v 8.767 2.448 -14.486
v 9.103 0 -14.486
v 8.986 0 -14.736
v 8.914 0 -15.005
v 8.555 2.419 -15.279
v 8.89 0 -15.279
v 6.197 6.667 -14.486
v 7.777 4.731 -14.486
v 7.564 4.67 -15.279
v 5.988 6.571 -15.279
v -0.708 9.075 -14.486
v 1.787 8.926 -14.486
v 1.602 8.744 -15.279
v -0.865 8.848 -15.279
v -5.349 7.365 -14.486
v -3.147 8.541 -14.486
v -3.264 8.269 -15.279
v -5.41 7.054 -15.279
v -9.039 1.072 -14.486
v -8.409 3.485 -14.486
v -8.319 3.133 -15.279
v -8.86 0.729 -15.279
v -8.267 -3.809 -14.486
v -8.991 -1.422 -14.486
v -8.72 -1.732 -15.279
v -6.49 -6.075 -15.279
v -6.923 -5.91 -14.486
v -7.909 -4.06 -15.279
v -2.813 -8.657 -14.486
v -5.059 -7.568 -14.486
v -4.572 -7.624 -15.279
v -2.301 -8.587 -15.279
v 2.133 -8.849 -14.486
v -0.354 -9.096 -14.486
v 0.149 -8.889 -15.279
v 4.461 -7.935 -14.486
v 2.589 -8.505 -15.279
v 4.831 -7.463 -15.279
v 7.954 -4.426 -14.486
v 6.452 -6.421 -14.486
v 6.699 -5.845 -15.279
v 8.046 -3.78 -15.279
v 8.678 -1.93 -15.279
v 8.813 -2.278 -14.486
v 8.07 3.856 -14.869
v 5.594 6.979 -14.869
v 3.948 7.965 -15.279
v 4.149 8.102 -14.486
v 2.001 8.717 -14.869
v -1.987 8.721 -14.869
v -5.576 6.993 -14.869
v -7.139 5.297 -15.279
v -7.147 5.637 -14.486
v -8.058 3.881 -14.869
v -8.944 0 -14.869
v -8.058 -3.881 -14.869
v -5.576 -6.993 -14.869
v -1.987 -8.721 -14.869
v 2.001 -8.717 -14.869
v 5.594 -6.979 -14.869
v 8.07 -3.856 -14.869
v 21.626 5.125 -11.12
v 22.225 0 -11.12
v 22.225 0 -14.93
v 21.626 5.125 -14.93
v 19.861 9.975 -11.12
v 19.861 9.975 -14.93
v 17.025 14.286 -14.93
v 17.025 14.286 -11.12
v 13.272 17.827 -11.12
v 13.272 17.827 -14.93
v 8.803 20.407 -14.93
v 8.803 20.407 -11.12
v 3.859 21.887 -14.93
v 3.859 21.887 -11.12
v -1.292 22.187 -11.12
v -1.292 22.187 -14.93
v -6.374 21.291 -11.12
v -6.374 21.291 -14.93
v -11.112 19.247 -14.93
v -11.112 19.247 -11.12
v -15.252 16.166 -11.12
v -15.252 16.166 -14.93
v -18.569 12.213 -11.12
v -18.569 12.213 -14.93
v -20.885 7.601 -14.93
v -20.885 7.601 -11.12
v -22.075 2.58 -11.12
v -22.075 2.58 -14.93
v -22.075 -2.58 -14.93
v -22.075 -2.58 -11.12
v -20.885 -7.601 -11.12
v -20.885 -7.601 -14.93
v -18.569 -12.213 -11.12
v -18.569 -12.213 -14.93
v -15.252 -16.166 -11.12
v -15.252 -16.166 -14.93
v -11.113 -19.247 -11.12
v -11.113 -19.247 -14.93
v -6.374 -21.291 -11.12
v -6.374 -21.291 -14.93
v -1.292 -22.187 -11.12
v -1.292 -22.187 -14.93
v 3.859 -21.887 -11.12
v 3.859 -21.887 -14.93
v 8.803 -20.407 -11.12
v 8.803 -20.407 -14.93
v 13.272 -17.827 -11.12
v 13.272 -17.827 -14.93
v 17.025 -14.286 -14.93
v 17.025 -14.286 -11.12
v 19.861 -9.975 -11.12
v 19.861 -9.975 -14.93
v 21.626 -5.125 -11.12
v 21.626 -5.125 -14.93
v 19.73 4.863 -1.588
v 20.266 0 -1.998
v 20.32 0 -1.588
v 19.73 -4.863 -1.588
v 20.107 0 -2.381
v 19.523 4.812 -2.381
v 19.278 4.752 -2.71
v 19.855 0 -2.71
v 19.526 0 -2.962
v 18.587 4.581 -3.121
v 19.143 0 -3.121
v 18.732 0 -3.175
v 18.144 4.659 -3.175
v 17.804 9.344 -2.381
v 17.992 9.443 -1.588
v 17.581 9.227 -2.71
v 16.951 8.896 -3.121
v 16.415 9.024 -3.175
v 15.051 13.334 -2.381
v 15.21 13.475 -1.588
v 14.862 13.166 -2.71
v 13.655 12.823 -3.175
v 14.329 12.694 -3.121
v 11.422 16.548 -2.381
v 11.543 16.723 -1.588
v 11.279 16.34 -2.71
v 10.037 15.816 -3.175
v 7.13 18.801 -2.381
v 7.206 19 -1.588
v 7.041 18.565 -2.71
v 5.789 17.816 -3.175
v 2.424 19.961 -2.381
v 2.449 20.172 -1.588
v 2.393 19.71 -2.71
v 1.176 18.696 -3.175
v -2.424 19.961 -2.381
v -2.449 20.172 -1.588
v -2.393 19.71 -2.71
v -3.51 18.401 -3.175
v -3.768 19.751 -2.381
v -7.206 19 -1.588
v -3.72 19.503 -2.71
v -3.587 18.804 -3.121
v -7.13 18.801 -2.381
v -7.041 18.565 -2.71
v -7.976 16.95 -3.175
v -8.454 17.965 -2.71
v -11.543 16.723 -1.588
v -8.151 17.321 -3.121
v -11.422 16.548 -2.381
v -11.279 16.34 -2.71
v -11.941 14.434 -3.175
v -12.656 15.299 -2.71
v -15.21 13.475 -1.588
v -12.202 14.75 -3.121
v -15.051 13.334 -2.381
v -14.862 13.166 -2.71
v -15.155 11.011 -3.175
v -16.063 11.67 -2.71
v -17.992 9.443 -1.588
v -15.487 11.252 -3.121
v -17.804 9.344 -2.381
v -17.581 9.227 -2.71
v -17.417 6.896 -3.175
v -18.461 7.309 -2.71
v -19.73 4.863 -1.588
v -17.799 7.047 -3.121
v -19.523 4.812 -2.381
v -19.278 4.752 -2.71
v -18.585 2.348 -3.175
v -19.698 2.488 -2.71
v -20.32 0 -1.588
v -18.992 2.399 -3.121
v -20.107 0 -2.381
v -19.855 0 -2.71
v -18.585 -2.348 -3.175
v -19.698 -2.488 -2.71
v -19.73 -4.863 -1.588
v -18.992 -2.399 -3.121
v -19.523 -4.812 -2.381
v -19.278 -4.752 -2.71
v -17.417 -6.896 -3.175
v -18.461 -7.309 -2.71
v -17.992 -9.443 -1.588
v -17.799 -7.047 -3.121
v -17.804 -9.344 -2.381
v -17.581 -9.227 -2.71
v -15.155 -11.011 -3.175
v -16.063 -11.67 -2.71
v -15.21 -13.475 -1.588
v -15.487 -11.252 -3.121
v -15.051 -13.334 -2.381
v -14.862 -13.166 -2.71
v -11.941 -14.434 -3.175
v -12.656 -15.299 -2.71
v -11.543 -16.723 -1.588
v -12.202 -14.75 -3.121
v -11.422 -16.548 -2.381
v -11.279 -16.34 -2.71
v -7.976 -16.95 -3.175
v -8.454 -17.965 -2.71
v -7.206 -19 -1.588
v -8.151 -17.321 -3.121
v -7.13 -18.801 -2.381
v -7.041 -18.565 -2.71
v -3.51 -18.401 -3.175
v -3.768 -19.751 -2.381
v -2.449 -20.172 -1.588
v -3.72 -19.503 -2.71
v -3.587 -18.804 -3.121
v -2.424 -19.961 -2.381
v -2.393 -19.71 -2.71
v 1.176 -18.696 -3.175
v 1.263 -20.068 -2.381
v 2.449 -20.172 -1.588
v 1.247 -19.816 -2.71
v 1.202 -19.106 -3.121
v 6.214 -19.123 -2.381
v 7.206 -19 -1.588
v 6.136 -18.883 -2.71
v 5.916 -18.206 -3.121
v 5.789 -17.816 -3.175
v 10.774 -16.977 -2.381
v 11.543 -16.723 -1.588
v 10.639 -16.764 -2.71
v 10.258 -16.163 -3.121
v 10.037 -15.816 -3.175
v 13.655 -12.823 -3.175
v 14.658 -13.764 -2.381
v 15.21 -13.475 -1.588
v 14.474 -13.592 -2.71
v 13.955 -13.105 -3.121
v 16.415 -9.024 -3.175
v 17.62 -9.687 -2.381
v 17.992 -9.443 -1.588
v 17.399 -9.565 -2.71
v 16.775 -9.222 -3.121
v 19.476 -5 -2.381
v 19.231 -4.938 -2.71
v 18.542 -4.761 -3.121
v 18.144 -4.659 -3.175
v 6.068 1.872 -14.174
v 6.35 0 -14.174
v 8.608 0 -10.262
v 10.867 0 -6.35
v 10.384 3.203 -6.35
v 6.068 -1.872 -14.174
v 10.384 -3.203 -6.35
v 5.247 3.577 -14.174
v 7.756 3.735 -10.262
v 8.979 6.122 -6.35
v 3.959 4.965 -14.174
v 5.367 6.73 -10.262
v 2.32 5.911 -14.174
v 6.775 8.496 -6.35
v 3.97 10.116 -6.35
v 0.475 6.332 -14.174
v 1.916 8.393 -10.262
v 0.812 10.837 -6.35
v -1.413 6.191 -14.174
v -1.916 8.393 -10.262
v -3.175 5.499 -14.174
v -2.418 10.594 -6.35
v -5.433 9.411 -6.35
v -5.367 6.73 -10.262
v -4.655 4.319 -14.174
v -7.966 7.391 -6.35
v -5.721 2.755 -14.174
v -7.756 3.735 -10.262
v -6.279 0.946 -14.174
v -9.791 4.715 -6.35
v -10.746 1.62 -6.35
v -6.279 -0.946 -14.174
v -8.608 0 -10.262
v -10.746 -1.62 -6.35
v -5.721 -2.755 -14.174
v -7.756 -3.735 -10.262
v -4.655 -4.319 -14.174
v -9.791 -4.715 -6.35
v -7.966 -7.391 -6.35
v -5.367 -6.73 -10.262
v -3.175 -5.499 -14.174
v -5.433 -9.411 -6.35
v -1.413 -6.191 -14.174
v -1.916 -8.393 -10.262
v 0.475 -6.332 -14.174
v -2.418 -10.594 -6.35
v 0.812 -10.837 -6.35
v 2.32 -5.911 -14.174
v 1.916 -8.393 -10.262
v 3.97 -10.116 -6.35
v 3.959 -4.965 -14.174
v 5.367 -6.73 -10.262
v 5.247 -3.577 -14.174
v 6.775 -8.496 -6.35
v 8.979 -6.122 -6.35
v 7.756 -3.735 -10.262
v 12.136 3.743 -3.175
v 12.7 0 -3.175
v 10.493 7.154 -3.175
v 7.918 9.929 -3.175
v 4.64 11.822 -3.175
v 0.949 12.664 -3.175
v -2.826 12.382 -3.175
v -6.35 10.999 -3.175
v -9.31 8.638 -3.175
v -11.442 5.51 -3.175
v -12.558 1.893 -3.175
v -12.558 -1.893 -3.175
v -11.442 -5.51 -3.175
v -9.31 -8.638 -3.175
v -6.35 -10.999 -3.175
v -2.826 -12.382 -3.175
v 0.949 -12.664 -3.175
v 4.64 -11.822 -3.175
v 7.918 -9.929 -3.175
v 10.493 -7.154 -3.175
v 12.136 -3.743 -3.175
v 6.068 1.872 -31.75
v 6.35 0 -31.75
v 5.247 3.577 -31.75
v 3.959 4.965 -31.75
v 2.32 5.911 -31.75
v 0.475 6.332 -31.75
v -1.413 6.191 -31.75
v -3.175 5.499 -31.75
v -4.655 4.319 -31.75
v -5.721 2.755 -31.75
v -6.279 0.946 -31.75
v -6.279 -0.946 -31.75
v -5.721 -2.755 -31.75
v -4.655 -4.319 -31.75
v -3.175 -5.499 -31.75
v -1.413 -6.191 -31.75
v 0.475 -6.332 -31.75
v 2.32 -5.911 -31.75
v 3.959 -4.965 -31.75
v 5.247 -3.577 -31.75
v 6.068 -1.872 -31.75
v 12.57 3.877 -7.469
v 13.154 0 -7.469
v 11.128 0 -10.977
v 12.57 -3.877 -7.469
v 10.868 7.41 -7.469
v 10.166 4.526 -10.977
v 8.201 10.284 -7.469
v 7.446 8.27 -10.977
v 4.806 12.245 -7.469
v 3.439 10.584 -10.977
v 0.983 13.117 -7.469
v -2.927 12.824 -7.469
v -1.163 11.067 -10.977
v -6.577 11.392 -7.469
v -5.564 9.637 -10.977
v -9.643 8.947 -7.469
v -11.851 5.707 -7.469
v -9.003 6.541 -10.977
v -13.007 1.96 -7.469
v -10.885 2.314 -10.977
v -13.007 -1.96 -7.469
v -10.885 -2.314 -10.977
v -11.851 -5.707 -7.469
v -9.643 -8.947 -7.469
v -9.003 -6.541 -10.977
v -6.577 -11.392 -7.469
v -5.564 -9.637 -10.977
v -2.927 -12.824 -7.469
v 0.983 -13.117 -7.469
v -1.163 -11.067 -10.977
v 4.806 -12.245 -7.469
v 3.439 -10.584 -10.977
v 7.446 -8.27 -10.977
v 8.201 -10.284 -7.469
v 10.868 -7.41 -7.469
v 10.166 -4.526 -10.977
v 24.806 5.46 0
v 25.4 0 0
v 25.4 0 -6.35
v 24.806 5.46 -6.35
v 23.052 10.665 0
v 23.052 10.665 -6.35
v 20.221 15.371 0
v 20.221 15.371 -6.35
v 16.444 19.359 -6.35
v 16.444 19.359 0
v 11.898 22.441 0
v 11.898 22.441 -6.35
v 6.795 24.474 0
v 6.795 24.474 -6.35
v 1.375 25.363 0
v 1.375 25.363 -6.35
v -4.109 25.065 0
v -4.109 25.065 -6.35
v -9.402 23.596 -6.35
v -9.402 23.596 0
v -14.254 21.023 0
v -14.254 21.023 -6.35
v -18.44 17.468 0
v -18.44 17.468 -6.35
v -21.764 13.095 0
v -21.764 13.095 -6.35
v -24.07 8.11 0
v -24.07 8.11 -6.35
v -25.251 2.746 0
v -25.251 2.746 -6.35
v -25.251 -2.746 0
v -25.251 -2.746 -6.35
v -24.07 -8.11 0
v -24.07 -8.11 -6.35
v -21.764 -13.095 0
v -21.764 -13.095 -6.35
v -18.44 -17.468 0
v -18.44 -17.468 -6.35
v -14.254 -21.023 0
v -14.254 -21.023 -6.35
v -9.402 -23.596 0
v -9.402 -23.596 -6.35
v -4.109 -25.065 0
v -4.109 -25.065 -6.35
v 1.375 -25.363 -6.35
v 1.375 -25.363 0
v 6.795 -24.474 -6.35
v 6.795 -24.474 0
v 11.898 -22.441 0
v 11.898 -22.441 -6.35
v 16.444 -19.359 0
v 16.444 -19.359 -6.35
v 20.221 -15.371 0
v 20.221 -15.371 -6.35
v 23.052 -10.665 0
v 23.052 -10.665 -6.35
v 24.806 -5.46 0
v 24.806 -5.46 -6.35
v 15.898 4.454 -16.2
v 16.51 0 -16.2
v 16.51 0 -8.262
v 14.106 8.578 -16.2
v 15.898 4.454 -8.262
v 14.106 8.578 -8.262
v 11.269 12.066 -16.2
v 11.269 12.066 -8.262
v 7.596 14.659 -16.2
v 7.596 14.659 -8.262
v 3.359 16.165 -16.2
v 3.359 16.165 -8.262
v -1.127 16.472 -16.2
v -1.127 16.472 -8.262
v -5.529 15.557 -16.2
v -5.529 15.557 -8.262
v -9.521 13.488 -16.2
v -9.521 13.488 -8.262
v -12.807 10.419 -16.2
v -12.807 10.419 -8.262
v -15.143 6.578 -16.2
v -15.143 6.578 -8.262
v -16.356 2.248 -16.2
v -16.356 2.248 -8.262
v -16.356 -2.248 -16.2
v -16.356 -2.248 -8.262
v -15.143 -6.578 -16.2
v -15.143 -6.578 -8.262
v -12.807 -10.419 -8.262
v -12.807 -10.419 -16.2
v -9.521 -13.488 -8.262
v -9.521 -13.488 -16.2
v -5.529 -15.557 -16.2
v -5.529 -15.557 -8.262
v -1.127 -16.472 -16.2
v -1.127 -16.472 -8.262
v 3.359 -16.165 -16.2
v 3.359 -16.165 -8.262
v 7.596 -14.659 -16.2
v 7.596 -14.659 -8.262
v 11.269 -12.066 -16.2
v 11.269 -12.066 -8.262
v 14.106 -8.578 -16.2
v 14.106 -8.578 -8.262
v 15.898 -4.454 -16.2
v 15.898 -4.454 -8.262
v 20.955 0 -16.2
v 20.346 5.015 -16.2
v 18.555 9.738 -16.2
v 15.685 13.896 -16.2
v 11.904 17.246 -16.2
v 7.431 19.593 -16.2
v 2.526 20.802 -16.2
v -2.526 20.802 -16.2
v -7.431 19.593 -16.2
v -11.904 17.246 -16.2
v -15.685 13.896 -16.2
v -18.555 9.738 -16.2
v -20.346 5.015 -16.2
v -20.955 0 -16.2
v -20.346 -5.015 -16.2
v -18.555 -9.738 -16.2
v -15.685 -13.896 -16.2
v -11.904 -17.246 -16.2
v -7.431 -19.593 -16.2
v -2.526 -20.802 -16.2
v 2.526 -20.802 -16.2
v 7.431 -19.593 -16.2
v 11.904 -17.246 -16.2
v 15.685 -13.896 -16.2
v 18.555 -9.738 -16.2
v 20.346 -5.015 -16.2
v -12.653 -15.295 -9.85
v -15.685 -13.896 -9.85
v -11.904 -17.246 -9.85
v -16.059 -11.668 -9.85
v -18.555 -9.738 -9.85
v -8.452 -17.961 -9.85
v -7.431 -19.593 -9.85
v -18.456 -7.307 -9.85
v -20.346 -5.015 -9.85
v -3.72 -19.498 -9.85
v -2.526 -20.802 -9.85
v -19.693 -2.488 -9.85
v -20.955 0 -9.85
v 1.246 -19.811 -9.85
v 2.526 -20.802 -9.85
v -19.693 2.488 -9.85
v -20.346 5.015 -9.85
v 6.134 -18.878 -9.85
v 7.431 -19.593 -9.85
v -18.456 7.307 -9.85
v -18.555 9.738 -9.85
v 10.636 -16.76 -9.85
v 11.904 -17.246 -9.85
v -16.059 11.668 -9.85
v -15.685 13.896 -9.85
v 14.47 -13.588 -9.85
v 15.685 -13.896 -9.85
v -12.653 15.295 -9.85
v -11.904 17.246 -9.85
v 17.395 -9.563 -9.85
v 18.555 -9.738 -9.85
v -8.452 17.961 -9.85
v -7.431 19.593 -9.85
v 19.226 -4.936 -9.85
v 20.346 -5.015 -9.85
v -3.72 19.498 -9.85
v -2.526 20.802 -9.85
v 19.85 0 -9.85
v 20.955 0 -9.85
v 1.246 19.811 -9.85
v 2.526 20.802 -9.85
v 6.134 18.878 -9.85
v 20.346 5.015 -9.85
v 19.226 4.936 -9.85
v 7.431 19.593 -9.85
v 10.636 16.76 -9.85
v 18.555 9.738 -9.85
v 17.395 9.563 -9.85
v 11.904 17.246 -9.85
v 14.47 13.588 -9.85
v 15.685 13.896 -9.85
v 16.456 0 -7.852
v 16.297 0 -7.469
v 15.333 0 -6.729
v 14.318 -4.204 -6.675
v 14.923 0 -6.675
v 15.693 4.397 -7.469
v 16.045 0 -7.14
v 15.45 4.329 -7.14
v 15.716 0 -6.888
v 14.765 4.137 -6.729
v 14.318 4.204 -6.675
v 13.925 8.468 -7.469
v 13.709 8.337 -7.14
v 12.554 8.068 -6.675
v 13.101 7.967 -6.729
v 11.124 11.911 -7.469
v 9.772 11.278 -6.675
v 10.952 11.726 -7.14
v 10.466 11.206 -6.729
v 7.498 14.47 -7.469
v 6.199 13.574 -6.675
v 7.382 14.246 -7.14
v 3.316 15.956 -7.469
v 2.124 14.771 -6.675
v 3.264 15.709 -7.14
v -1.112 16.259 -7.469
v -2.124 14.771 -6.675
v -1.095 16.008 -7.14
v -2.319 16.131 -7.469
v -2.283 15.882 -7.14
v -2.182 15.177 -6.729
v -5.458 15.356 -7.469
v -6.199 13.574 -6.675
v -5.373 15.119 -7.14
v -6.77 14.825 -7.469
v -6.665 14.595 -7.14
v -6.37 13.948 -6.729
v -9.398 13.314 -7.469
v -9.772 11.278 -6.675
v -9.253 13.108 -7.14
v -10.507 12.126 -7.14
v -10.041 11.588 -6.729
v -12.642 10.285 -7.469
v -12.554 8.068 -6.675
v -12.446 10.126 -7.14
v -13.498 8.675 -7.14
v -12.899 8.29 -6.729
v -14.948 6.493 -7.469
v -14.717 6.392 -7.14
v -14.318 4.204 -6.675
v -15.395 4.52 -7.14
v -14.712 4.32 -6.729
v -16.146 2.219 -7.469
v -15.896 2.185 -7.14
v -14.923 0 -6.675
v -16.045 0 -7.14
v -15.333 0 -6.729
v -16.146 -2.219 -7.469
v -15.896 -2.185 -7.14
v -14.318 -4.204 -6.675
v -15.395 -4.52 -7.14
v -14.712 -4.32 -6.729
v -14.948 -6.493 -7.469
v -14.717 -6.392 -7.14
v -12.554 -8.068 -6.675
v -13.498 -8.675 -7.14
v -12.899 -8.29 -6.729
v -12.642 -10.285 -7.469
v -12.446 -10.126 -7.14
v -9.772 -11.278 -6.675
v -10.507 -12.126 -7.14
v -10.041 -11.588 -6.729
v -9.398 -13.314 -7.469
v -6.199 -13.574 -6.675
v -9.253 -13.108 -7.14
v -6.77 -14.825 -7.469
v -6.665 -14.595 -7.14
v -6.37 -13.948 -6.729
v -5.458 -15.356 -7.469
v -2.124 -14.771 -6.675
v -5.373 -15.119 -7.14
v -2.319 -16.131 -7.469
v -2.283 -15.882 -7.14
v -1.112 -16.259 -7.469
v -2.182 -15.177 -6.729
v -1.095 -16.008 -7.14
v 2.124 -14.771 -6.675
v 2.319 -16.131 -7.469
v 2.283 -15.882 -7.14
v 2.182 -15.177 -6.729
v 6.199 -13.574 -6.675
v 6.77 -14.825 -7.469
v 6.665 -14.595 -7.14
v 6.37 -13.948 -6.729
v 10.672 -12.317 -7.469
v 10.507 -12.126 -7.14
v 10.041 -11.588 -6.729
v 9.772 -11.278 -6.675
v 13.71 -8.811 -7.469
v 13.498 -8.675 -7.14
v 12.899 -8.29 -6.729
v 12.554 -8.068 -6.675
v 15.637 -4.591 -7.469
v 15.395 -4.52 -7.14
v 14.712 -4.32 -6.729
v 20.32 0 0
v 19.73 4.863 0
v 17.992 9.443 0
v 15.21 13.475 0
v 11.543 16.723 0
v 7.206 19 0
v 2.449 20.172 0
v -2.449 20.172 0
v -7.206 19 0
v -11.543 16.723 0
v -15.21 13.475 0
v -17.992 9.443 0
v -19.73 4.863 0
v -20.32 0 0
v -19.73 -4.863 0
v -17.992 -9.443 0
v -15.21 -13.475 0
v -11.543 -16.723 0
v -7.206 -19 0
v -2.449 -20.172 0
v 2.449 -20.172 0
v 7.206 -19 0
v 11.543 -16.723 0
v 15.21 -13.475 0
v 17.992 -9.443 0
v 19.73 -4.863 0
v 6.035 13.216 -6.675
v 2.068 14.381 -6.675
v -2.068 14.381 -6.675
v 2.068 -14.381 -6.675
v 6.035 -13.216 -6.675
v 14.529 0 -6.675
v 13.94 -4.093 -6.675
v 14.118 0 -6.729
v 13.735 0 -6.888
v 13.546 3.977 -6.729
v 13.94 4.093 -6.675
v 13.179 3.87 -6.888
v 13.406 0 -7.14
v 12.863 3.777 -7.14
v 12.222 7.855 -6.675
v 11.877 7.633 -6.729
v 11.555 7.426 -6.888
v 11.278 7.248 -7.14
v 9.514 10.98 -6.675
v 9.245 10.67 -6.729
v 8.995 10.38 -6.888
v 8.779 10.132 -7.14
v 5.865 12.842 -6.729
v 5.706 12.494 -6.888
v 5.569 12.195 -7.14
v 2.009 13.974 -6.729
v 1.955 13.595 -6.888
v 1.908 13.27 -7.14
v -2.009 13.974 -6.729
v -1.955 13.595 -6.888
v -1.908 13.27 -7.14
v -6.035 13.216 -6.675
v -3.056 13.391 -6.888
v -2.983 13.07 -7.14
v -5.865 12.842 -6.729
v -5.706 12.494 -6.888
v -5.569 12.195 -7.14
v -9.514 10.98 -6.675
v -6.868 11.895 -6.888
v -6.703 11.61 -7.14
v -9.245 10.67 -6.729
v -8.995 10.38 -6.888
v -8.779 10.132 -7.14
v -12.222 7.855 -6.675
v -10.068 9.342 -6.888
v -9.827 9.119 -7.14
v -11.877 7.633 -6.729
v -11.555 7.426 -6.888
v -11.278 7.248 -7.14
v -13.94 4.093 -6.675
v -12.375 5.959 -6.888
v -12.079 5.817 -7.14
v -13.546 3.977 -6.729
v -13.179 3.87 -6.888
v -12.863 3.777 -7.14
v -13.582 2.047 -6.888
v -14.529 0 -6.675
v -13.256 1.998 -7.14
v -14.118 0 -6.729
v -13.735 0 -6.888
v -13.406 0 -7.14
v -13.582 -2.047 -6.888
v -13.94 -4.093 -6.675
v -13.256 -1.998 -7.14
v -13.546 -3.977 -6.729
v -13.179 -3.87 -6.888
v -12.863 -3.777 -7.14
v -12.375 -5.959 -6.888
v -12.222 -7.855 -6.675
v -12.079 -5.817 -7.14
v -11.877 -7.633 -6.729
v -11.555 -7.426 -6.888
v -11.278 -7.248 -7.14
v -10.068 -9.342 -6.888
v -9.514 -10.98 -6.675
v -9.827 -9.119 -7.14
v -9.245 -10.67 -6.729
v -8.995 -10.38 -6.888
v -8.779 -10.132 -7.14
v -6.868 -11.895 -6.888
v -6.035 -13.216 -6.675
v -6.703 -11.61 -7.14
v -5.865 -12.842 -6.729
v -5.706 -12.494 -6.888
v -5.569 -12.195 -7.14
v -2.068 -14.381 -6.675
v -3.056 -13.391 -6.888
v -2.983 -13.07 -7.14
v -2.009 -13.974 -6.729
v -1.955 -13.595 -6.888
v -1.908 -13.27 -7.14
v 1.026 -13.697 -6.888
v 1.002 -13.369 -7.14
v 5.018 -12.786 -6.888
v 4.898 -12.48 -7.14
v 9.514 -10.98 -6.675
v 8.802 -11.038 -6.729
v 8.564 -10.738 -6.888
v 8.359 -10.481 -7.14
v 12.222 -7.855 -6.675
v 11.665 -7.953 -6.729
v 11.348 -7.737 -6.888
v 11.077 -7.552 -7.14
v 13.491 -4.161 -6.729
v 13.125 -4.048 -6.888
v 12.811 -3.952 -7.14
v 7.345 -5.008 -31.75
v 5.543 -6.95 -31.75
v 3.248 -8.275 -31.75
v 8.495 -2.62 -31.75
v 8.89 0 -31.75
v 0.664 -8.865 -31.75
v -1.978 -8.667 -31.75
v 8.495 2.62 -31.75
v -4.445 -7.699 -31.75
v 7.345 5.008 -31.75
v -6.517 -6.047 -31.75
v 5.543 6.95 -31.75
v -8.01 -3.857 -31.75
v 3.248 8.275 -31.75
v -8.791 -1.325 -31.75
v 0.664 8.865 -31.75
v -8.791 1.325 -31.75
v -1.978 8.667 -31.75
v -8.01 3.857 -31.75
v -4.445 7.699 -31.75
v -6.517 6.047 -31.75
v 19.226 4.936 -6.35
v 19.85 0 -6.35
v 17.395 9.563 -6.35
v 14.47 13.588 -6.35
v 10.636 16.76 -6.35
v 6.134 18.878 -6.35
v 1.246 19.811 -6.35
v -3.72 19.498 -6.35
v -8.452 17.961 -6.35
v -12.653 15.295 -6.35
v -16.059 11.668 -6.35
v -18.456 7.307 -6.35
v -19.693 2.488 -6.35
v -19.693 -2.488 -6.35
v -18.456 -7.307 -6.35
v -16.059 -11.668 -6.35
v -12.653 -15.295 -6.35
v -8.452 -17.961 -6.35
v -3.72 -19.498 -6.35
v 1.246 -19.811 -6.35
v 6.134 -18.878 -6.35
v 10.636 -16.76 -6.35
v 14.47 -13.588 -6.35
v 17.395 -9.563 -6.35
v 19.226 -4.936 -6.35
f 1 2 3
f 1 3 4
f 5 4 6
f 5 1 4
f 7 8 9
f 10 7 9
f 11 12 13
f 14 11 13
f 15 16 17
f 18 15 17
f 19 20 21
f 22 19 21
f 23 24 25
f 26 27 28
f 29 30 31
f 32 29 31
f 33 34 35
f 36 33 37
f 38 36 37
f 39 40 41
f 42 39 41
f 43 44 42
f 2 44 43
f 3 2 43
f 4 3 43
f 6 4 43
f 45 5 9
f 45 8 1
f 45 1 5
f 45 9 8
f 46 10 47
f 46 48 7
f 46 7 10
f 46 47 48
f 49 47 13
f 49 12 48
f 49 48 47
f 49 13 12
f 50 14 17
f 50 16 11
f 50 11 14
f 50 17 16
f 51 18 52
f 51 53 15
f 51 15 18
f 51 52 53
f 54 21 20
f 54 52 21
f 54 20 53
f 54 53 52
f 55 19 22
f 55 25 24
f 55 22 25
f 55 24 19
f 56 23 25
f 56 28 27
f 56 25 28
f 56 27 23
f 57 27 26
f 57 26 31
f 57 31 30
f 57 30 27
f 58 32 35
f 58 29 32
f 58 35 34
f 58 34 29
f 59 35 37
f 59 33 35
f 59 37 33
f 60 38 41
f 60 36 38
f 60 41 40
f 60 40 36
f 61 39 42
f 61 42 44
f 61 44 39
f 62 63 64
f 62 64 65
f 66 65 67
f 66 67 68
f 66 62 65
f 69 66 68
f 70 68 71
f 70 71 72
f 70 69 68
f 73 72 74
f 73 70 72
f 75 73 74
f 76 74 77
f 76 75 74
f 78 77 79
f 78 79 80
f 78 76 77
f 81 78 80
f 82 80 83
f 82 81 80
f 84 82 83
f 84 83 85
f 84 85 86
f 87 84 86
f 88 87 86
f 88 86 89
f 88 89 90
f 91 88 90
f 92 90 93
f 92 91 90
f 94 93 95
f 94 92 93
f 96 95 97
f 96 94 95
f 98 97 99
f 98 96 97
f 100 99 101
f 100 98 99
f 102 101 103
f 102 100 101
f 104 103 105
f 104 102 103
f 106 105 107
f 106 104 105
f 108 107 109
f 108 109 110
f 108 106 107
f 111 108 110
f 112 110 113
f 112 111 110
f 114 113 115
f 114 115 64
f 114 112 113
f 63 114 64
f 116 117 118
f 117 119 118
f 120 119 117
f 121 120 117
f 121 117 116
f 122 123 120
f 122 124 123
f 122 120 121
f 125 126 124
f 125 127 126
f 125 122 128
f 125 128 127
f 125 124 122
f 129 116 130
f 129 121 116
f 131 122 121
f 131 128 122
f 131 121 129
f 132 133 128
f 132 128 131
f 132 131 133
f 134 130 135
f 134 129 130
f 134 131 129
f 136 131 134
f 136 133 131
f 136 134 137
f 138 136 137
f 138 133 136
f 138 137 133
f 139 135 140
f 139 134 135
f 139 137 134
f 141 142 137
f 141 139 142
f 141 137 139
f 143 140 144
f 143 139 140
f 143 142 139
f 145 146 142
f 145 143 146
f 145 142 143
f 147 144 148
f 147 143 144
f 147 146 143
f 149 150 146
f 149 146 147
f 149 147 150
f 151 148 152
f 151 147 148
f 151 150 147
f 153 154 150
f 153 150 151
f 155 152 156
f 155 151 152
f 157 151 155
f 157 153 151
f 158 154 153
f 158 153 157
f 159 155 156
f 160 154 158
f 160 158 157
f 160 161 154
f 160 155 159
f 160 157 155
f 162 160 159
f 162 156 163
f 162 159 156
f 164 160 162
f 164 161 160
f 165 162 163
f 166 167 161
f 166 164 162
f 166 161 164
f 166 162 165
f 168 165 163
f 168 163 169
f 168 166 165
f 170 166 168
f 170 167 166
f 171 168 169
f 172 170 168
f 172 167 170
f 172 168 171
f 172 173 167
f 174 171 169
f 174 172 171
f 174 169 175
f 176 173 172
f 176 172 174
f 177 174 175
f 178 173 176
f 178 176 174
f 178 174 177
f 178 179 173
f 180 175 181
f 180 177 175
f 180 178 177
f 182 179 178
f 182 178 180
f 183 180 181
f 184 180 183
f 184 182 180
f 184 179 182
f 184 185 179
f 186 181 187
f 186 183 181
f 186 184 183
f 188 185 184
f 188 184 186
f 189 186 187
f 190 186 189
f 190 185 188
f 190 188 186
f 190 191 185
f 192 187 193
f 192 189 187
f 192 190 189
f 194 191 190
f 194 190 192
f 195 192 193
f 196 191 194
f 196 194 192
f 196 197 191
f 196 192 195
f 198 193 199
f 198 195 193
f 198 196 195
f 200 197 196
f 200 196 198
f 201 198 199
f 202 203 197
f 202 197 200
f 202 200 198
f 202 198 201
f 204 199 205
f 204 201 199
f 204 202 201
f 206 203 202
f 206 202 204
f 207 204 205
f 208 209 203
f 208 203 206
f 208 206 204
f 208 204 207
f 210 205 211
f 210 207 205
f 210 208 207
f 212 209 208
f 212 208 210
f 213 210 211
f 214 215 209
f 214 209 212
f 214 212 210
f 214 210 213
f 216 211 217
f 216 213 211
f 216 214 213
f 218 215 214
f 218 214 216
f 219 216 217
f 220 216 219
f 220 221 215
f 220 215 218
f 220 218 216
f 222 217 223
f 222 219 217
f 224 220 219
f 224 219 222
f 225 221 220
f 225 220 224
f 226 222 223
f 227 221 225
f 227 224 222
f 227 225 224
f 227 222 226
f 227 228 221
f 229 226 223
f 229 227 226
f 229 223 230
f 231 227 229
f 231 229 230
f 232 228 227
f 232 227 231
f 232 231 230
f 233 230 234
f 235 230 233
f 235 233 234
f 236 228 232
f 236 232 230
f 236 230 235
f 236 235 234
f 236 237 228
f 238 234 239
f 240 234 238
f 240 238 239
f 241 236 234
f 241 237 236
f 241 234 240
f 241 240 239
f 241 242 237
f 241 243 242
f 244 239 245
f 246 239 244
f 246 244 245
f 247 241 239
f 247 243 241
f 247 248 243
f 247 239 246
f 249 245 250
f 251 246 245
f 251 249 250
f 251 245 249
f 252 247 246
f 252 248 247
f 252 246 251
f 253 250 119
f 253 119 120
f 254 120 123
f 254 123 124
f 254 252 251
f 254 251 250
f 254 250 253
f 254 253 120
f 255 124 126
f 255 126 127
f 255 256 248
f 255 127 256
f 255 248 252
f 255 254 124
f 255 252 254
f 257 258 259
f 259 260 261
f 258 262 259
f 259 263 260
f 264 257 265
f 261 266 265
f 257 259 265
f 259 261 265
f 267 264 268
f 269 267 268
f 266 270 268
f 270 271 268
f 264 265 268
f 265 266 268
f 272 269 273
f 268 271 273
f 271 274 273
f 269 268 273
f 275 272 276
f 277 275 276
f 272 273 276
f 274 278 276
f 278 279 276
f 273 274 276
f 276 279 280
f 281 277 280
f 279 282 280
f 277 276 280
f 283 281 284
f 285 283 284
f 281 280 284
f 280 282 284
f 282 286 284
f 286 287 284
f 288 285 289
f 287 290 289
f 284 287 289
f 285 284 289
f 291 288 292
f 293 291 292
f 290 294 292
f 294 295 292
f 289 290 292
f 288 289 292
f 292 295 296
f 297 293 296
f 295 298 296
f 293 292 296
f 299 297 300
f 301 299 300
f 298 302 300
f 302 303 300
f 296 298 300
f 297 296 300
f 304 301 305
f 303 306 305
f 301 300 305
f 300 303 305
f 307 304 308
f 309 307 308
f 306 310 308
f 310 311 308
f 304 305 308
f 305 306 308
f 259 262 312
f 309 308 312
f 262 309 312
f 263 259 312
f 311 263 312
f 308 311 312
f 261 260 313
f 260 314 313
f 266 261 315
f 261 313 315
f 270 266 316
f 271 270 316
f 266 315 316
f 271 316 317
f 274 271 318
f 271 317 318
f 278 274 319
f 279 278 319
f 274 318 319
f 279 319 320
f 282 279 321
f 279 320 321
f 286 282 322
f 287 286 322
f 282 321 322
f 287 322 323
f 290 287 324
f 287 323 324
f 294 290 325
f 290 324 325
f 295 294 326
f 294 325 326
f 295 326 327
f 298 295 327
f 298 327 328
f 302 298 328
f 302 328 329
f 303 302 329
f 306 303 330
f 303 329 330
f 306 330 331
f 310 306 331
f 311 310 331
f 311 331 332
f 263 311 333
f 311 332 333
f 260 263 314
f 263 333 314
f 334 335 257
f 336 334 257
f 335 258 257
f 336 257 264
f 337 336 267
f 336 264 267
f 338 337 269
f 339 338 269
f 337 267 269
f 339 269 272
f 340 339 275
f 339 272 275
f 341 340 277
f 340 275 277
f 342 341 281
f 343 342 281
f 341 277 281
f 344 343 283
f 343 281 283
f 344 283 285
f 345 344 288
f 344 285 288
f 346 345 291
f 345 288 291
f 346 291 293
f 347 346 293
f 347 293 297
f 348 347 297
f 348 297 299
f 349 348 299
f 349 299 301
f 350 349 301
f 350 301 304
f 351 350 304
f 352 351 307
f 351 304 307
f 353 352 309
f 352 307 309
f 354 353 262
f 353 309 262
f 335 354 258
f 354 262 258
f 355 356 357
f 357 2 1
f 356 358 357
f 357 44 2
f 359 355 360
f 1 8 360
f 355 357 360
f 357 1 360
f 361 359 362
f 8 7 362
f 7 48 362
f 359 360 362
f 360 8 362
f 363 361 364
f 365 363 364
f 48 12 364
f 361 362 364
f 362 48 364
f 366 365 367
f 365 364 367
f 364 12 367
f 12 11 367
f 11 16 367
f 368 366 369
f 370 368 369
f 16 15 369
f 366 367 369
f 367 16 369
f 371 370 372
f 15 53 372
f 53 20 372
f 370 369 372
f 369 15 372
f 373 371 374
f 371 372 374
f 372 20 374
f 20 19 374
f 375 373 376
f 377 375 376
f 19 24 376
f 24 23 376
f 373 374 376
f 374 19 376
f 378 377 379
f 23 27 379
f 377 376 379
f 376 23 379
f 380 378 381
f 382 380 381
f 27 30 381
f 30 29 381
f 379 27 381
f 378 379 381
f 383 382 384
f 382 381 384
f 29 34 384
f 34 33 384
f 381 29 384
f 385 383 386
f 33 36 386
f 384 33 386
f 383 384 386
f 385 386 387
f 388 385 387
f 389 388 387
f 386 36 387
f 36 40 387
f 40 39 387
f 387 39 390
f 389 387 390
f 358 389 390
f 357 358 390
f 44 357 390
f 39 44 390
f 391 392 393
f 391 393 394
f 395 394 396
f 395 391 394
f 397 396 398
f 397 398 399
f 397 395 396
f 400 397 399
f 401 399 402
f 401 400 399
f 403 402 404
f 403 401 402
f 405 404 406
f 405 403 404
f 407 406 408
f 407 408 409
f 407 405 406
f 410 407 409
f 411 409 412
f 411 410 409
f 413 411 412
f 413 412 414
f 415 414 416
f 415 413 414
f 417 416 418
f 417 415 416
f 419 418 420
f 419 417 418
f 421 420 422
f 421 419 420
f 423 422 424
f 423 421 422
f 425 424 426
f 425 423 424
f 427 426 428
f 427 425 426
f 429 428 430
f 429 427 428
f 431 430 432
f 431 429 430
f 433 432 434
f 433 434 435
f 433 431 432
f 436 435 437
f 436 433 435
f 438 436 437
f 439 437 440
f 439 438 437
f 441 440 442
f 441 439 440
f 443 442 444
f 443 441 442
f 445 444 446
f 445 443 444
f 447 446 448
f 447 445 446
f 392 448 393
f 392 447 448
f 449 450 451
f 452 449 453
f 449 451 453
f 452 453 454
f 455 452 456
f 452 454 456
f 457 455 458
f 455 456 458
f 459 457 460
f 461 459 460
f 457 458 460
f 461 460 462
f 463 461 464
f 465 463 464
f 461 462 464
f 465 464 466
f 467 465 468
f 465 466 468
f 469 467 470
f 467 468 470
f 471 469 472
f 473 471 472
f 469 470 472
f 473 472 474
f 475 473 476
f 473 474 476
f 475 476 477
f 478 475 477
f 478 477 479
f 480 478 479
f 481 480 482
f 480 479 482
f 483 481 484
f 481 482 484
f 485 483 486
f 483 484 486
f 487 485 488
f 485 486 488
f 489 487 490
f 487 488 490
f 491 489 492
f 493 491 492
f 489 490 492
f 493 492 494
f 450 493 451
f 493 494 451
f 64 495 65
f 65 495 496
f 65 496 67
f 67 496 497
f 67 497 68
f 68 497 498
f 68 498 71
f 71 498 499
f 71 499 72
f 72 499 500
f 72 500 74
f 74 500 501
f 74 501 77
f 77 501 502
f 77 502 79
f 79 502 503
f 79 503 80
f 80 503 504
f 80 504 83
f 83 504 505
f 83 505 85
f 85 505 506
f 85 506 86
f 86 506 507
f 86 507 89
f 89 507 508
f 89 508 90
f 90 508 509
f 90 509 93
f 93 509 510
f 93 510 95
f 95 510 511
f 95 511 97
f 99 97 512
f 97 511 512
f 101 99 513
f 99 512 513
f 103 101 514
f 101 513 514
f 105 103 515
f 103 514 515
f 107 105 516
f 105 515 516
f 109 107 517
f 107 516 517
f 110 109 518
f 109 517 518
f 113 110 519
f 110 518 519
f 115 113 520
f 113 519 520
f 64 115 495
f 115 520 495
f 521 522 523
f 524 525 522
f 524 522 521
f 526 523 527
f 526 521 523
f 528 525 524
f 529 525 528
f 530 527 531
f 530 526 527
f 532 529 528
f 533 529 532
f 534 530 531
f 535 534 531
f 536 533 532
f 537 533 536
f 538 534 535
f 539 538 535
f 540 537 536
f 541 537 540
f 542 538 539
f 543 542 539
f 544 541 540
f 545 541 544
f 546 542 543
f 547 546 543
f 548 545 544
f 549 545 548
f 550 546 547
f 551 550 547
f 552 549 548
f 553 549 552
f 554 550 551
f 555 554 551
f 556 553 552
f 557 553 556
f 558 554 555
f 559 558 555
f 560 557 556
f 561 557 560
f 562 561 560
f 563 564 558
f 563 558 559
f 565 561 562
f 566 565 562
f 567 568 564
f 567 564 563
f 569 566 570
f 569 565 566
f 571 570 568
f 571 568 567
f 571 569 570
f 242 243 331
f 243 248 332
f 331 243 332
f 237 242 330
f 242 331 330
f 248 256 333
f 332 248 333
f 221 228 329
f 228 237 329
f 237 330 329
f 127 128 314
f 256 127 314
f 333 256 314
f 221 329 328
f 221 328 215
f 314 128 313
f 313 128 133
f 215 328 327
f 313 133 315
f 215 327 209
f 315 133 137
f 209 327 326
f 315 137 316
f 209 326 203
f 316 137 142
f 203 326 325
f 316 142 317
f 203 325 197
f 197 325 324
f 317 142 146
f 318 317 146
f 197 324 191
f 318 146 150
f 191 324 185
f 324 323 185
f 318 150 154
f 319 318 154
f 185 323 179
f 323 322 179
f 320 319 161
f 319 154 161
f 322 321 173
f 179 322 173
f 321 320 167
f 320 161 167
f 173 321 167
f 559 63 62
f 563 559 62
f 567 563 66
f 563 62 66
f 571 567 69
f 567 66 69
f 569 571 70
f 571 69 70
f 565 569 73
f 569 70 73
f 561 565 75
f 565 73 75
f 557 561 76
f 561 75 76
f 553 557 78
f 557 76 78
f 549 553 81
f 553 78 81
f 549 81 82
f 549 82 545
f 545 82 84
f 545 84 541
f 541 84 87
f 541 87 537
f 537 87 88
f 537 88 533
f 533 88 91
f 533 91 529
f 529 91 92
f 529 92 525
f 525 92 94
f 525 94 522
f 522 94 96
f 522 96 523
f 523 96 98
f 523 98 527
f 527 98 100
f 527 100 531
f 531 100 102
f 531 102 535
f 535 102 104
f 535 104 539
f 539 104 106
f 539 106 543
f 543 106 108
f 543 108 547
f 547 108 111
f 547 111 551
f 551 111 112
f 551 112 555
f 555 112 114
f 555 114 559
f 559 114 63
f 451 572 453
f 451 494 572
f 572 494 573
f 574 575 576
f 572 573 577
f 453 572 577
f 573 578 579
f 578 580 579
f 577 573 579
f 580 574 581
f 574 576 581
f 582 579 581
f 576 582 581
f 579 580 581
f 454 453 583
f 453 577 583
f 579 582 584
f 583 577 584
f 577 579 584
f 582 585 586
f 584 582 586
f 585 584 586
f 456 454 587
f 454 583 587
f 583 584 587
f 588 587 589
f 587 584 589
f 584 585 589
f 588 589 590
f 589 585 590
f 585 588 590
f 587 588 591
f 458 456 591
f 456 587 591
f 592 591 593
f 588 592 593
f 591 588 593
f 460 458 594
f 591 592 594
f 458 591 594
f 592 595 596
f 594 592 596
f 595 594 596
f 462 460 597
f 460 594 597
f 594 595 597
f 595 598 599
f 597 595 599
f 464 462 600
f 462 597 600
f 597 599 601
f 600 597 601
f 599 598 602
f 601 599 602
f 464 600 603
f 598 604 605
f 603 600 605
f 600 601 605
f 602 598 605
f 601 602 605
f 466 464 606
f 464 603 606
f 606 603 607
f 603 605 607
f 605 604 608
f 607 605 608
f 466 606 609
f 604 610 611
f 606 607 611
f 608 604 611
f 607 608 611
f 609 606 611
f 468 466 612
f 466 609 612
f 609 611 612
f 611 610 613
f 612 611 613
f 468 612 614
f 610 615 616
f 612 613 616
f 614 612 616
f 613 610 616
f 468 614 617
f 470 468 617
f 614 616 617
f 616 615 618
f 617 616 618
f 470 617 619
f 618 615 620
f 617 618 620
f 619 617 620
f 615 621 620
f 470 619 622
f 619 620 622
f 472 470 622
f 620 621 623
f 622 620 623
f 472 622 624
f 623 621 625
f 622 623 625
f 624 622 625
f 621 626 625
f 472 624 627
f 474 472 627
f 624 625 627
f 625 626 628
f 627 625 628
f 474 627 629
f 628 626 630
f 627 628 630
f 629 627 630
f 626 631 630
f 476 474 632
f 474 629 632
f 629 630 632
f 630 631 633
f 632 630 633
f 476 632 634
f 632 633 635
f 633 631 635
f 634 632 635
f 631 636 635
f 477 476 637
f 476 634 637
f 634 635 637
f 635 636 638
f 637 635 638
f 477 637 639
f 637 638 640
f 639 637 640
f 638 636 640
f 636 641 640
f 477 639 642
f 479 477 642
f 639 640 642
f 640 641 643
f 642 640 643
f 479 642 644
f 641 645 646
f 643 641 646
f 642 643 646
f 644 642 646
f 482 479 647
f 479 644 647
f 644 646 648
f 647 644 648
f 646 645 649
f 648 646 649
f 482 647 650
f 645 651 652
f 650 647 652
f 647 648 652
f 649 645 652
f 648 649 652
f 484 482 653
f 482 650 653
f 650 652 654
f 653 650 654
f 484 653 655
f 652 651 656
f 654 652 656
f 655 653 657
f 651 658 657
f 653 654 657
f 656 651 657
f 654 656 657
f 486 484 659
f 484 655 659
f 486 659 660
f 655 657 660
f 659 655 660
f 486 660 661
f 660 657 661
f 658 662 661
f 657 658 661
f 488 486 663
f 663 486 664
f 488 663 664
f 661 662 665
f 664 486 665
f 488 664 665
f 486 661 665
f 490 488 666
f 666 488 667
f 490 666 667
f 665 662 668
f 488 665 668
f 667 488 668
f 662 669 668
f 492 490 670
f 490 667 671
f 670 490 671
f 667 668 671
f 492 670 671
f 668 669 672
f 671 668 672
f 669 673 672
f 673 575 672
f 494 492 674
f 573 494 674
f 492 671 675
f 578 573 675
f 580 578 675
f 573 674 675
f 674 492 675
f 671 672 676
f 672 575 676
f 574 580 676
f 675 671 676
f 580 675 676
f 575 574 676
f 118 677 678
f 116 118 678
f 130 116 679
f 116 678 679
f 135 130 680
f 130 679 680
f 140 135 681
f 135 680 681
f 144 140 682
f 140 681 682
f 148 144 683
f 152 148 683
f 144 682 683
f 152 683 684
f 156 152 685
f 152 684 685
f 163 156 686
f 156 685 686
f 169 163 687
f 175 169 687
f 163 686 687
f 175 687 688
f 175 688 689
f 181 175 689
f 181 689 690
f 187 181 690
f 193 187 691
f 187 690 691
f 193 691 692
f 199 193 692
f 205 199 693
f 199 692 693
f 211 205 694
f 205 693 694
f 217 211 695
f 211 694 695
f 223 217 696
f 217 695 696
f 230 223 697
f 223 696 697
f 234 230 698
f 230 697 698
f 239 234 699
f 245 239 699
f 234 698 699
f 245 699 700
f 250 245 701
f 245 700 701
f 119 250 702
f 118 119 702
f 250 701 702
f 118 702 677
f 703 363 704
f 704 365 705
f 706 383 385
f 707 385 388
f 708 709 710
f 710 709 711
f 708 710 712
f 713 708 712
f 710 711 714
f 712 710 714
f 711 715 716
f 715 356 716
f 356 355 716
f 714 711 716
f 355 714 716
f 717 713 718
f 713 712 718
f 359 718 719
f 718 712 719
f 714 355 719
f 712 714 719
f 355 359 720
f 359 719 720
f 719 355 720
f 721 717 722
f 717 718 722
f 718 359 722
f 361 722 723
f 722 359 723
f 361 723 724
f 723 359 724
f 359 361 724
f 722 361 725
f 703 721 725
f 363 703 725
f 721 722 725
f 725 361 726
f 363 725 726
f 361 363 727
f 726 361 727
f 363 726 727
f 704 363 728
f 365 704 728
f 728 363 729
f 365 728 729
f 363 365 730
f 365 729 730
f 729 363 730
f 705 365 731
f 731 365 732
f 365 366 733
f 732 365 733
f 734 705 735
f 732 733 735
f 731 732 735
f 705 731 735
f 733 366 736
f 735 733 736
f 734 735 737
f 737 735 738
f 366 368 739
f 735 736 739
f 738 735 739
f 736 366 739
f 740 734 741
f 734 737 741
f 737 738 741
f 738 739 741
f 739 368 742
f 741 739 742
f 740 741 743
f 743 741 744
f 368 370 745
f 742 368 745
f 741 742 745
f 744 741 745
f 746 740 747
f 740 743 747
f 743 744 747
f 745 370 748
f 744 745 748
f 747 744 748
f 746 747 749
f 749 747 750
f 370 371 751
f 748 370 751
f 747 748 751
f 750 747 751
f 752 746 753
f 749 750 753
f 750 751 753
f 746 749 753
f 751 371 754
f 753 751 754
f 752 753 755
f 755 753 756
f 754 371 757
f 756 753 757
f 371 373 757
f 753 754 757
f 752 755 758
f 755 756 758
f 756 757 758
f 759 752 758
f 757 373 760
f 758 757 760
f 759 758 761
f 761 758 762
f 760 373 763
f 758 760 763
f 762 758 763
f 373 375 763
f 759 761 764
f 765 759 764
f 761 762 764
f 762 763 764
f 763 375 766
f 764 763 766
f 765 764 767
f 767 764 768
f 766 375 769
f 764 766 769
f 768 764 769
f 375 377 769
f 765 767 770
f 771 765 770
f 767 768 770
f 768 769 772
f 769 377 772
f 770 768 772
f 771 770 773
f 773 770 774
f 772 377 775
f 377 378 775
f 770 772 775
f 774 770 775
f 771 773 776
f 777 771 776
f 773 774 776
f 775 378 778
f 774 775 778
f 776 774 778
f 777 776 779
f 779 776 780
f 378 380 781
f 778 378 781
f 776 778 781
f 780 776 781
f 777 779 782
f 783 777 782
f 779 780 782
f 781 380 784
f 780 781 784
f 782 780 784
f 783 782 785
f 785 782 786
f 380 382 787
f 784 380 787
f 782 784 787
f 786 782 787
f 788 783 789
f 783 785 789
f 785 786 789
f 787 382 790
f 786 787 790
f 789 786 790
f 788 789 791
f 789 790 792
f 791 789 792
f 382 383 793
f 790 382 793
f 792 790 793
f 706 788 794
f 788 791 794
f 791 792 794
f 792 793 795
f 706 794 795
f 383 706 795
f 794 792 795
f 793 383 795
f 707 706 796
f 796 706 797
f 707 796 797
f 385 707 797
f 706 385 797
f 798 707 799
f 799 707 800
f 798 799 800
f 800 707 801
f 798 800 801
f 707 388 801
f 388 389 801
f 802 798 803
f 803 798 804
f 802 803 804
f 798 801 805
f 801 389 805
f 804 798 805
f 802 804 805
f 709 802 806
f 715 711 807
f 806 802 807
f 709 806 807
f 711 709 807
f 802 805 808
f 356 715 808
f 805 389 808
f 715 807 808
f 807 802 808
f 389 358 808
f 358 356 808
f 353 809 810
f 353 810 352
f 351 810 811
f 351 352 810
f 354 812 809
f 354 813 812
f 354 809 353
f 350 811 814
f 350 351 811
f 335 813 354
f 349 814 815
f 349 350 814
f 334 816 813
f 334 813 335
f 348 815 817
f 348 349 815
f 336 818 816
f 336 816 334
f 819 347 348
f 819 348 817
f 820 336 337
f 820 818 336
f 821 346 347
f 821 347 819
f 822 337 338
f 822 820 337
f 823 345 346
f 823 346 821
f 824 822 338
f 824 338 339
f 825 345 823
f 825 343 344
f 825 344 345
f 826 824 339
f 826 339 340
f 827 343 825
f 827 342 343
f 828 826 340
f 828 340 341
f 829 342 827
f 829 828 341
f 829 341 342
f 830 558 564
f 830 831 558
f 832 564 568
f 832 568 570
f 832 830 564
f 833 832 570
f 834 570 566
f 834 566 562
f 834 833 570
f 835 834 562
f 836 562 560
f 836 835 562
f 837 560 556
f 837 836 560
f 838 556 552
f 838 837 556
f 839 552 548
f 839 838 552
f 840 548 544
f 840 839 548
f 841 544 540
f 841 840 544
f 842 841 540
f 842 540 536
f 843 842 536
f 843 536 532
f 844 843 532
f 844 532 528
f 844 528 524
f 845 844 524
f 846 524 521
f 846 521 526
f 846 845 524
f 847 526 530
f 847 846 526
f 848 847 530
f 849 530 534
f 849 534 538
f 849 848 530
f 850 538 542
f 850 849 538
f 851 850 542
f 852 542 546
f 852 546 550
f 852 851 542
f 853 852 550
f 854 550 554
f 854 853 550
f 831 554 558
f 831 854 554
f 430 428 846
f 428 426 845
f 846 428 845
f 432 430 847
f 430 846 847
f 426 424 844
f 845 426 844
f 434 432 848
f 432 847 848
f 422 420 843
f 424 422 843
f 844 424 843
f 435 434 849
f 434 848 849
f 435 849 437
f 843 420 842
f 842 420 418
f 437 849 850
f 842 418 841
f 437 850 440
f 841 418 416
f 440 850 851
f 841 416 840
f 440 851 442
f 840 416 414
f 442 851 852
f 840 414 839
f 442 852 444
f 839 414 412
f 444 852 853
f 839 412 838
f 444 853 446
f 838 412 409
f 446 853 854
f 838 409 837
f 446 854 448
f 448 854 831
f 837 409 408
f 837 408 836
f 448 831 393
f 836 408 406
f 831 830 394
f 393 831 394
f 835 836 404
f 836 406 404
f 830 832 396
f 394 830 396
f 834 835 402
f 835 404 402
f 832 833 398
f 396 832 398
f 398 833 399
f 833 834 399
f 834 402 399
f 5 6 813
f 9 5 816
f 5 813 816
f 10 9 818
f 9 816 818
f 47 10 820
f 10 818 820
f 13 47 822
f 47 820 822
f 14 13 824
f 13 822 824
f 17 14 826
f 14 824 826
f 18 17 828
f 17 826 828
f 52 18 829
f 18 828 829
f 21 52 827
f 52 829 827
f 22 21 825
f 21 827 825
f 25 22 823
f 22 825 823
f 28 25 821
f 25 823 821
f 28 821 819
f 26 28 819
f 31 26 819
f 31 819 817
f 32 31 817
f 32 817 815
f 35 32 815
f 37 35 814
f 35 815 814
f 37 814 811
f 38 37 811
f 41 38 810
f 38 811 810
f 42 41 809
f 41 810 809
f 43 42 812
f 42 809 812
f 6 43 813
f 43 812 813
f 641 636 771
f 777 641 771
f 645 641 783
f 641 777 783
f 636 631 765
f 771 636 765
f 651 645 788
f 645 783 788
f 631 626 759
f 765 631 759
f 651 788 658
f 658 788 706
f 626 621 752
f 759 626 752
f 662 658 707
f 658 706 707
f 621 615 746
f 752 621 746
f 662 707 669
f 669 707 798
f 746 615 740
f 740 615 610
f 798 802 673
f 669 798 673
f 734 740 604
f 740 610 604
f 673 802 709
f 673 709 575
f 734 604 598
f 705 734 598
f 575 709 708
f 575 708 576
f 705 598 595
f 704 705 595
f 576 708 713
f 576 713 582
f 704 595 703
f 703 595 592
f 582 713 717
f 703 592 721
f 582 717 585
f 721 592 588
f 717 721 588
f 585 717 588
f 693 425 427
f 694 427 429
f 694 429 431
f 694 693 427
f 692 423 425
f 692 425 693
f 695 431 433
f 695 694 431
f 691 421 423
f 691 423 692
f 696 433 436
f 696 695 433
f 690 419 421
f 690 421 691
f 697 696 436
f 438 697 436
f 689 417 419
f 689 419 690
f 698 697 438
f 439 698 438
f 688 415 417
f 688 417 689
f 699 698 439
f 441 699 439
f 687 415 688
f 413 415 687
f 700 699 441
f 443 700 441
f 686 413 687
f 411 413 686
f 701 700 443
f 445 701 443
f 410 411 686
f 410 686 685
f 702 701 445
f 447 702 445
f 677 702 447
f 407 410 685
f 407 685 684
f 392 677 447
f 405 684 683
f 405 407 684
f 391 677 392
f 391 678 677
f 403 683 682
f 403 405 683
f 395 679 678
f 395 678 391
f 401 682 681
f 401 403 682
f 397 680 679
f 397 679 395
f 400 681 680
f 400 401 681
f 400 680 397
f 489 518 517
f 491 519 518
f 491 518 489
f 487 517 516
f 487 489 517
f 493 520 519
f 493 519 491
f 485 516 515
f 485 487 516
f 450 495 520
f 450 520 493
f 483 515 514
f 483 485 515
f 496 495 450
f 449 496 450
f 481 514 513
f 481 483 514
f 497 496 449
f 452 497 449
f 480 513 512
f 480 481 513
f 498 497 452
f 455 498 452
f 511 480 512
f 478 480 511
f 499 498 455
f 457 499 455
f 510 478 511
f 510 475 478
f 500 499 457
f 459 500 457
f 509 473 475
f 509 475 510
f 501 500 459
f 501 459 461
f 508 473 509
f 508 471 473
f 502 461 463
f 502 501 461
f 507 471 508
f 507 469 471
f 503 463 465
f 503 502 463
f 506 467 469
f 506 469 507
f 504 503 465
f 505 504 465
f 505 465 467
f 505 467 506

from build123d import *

# Parameters (mm, degrees)
F0_R     = 25.4
F1_DEPTH = 6.35
F4_SIZE  = 1.27
F9_R     = 1.5875


with BuildPart() as f1:
    # F0 (on Top) → F1 (new body)
    with BuildSketch(Plane.XY):
        Circle(F0_R)
    extrude(amount=-F1_DEPTH)

    # F2 (on Front) → F3 (revolve)
    with BuildSketch(Plane.XZ):
        Polygon((19.85, -6.35), (0, -6.35), (0, -31.75), (9.525, -31.75), (9.525, -16.2), (22.225, -16.2), (22.225, -9.85), (19.85, -9.85), align=None)
    revolve(axis=Axis((0, 0, -19.05), (0, 0, 1)))

    # F4
    f4_edges = [f1.edges().sort_by_distance(p)[0] for p in [
        (-22.225, 0, -9.85),
        (-22.225, 0, -16.2),
    ]]
    chamfer(f4_edges, length=F4_SIZE)

    # F5 (on Front) → F6 (revolve, cut)
    with BuildSketch(Plane.XZ):
        Polygon((20.32, 0), (0, 0), (0, -6.35), (10.8669128953, -6.35), (12.7, -3.175), (20.32, -3.175), align=None)
        Polygon((10.8669128953, -6.35), (0, -6.35), (0, -42.1200841665), (6.35, -42.1200841665), (6.35, -14.1735226281), align=None)
    revolve(axis=Axis((0, 0, 5.083523225), (0, 0, 1)), mode=Mode.SUBTRACT)

    # F7 (on Front) → F8 (revolve, cut)
    with BuildSketch(Plane.XZ):
        Polygon((16.51, -31.75), (16.51, -16.2), (9.525, -16.2), (8.89, -16.2), (8.89, -31.75), (9.525, -31.75), align=None)
        Polygon((9.525, -16.2), (16.51, -16.2), (16.51, -6.675), (13.6122134253, -6.675), (8.89, -14.8541135768), (8.89, -16.2), align=None)
    revolve(axis=Axis((0, 0, -10.6237775408), (0, 0, 1)), mode=Mode.SUBTRACT)

    # F9
    f9_edges = [f1.edges().sort_by_distance(p)[0] for p in [
        (-16.51, 0, -6.675),
        (16.51, 0, -11.4375),
        (-13.612213, 0, -6.675),
        (-20.32, 0, -3.175),
        (-8.89, 0, -14.854114),
    ]]
    fillet(f9_edges, radius=F9_R)


solid = f1.part
